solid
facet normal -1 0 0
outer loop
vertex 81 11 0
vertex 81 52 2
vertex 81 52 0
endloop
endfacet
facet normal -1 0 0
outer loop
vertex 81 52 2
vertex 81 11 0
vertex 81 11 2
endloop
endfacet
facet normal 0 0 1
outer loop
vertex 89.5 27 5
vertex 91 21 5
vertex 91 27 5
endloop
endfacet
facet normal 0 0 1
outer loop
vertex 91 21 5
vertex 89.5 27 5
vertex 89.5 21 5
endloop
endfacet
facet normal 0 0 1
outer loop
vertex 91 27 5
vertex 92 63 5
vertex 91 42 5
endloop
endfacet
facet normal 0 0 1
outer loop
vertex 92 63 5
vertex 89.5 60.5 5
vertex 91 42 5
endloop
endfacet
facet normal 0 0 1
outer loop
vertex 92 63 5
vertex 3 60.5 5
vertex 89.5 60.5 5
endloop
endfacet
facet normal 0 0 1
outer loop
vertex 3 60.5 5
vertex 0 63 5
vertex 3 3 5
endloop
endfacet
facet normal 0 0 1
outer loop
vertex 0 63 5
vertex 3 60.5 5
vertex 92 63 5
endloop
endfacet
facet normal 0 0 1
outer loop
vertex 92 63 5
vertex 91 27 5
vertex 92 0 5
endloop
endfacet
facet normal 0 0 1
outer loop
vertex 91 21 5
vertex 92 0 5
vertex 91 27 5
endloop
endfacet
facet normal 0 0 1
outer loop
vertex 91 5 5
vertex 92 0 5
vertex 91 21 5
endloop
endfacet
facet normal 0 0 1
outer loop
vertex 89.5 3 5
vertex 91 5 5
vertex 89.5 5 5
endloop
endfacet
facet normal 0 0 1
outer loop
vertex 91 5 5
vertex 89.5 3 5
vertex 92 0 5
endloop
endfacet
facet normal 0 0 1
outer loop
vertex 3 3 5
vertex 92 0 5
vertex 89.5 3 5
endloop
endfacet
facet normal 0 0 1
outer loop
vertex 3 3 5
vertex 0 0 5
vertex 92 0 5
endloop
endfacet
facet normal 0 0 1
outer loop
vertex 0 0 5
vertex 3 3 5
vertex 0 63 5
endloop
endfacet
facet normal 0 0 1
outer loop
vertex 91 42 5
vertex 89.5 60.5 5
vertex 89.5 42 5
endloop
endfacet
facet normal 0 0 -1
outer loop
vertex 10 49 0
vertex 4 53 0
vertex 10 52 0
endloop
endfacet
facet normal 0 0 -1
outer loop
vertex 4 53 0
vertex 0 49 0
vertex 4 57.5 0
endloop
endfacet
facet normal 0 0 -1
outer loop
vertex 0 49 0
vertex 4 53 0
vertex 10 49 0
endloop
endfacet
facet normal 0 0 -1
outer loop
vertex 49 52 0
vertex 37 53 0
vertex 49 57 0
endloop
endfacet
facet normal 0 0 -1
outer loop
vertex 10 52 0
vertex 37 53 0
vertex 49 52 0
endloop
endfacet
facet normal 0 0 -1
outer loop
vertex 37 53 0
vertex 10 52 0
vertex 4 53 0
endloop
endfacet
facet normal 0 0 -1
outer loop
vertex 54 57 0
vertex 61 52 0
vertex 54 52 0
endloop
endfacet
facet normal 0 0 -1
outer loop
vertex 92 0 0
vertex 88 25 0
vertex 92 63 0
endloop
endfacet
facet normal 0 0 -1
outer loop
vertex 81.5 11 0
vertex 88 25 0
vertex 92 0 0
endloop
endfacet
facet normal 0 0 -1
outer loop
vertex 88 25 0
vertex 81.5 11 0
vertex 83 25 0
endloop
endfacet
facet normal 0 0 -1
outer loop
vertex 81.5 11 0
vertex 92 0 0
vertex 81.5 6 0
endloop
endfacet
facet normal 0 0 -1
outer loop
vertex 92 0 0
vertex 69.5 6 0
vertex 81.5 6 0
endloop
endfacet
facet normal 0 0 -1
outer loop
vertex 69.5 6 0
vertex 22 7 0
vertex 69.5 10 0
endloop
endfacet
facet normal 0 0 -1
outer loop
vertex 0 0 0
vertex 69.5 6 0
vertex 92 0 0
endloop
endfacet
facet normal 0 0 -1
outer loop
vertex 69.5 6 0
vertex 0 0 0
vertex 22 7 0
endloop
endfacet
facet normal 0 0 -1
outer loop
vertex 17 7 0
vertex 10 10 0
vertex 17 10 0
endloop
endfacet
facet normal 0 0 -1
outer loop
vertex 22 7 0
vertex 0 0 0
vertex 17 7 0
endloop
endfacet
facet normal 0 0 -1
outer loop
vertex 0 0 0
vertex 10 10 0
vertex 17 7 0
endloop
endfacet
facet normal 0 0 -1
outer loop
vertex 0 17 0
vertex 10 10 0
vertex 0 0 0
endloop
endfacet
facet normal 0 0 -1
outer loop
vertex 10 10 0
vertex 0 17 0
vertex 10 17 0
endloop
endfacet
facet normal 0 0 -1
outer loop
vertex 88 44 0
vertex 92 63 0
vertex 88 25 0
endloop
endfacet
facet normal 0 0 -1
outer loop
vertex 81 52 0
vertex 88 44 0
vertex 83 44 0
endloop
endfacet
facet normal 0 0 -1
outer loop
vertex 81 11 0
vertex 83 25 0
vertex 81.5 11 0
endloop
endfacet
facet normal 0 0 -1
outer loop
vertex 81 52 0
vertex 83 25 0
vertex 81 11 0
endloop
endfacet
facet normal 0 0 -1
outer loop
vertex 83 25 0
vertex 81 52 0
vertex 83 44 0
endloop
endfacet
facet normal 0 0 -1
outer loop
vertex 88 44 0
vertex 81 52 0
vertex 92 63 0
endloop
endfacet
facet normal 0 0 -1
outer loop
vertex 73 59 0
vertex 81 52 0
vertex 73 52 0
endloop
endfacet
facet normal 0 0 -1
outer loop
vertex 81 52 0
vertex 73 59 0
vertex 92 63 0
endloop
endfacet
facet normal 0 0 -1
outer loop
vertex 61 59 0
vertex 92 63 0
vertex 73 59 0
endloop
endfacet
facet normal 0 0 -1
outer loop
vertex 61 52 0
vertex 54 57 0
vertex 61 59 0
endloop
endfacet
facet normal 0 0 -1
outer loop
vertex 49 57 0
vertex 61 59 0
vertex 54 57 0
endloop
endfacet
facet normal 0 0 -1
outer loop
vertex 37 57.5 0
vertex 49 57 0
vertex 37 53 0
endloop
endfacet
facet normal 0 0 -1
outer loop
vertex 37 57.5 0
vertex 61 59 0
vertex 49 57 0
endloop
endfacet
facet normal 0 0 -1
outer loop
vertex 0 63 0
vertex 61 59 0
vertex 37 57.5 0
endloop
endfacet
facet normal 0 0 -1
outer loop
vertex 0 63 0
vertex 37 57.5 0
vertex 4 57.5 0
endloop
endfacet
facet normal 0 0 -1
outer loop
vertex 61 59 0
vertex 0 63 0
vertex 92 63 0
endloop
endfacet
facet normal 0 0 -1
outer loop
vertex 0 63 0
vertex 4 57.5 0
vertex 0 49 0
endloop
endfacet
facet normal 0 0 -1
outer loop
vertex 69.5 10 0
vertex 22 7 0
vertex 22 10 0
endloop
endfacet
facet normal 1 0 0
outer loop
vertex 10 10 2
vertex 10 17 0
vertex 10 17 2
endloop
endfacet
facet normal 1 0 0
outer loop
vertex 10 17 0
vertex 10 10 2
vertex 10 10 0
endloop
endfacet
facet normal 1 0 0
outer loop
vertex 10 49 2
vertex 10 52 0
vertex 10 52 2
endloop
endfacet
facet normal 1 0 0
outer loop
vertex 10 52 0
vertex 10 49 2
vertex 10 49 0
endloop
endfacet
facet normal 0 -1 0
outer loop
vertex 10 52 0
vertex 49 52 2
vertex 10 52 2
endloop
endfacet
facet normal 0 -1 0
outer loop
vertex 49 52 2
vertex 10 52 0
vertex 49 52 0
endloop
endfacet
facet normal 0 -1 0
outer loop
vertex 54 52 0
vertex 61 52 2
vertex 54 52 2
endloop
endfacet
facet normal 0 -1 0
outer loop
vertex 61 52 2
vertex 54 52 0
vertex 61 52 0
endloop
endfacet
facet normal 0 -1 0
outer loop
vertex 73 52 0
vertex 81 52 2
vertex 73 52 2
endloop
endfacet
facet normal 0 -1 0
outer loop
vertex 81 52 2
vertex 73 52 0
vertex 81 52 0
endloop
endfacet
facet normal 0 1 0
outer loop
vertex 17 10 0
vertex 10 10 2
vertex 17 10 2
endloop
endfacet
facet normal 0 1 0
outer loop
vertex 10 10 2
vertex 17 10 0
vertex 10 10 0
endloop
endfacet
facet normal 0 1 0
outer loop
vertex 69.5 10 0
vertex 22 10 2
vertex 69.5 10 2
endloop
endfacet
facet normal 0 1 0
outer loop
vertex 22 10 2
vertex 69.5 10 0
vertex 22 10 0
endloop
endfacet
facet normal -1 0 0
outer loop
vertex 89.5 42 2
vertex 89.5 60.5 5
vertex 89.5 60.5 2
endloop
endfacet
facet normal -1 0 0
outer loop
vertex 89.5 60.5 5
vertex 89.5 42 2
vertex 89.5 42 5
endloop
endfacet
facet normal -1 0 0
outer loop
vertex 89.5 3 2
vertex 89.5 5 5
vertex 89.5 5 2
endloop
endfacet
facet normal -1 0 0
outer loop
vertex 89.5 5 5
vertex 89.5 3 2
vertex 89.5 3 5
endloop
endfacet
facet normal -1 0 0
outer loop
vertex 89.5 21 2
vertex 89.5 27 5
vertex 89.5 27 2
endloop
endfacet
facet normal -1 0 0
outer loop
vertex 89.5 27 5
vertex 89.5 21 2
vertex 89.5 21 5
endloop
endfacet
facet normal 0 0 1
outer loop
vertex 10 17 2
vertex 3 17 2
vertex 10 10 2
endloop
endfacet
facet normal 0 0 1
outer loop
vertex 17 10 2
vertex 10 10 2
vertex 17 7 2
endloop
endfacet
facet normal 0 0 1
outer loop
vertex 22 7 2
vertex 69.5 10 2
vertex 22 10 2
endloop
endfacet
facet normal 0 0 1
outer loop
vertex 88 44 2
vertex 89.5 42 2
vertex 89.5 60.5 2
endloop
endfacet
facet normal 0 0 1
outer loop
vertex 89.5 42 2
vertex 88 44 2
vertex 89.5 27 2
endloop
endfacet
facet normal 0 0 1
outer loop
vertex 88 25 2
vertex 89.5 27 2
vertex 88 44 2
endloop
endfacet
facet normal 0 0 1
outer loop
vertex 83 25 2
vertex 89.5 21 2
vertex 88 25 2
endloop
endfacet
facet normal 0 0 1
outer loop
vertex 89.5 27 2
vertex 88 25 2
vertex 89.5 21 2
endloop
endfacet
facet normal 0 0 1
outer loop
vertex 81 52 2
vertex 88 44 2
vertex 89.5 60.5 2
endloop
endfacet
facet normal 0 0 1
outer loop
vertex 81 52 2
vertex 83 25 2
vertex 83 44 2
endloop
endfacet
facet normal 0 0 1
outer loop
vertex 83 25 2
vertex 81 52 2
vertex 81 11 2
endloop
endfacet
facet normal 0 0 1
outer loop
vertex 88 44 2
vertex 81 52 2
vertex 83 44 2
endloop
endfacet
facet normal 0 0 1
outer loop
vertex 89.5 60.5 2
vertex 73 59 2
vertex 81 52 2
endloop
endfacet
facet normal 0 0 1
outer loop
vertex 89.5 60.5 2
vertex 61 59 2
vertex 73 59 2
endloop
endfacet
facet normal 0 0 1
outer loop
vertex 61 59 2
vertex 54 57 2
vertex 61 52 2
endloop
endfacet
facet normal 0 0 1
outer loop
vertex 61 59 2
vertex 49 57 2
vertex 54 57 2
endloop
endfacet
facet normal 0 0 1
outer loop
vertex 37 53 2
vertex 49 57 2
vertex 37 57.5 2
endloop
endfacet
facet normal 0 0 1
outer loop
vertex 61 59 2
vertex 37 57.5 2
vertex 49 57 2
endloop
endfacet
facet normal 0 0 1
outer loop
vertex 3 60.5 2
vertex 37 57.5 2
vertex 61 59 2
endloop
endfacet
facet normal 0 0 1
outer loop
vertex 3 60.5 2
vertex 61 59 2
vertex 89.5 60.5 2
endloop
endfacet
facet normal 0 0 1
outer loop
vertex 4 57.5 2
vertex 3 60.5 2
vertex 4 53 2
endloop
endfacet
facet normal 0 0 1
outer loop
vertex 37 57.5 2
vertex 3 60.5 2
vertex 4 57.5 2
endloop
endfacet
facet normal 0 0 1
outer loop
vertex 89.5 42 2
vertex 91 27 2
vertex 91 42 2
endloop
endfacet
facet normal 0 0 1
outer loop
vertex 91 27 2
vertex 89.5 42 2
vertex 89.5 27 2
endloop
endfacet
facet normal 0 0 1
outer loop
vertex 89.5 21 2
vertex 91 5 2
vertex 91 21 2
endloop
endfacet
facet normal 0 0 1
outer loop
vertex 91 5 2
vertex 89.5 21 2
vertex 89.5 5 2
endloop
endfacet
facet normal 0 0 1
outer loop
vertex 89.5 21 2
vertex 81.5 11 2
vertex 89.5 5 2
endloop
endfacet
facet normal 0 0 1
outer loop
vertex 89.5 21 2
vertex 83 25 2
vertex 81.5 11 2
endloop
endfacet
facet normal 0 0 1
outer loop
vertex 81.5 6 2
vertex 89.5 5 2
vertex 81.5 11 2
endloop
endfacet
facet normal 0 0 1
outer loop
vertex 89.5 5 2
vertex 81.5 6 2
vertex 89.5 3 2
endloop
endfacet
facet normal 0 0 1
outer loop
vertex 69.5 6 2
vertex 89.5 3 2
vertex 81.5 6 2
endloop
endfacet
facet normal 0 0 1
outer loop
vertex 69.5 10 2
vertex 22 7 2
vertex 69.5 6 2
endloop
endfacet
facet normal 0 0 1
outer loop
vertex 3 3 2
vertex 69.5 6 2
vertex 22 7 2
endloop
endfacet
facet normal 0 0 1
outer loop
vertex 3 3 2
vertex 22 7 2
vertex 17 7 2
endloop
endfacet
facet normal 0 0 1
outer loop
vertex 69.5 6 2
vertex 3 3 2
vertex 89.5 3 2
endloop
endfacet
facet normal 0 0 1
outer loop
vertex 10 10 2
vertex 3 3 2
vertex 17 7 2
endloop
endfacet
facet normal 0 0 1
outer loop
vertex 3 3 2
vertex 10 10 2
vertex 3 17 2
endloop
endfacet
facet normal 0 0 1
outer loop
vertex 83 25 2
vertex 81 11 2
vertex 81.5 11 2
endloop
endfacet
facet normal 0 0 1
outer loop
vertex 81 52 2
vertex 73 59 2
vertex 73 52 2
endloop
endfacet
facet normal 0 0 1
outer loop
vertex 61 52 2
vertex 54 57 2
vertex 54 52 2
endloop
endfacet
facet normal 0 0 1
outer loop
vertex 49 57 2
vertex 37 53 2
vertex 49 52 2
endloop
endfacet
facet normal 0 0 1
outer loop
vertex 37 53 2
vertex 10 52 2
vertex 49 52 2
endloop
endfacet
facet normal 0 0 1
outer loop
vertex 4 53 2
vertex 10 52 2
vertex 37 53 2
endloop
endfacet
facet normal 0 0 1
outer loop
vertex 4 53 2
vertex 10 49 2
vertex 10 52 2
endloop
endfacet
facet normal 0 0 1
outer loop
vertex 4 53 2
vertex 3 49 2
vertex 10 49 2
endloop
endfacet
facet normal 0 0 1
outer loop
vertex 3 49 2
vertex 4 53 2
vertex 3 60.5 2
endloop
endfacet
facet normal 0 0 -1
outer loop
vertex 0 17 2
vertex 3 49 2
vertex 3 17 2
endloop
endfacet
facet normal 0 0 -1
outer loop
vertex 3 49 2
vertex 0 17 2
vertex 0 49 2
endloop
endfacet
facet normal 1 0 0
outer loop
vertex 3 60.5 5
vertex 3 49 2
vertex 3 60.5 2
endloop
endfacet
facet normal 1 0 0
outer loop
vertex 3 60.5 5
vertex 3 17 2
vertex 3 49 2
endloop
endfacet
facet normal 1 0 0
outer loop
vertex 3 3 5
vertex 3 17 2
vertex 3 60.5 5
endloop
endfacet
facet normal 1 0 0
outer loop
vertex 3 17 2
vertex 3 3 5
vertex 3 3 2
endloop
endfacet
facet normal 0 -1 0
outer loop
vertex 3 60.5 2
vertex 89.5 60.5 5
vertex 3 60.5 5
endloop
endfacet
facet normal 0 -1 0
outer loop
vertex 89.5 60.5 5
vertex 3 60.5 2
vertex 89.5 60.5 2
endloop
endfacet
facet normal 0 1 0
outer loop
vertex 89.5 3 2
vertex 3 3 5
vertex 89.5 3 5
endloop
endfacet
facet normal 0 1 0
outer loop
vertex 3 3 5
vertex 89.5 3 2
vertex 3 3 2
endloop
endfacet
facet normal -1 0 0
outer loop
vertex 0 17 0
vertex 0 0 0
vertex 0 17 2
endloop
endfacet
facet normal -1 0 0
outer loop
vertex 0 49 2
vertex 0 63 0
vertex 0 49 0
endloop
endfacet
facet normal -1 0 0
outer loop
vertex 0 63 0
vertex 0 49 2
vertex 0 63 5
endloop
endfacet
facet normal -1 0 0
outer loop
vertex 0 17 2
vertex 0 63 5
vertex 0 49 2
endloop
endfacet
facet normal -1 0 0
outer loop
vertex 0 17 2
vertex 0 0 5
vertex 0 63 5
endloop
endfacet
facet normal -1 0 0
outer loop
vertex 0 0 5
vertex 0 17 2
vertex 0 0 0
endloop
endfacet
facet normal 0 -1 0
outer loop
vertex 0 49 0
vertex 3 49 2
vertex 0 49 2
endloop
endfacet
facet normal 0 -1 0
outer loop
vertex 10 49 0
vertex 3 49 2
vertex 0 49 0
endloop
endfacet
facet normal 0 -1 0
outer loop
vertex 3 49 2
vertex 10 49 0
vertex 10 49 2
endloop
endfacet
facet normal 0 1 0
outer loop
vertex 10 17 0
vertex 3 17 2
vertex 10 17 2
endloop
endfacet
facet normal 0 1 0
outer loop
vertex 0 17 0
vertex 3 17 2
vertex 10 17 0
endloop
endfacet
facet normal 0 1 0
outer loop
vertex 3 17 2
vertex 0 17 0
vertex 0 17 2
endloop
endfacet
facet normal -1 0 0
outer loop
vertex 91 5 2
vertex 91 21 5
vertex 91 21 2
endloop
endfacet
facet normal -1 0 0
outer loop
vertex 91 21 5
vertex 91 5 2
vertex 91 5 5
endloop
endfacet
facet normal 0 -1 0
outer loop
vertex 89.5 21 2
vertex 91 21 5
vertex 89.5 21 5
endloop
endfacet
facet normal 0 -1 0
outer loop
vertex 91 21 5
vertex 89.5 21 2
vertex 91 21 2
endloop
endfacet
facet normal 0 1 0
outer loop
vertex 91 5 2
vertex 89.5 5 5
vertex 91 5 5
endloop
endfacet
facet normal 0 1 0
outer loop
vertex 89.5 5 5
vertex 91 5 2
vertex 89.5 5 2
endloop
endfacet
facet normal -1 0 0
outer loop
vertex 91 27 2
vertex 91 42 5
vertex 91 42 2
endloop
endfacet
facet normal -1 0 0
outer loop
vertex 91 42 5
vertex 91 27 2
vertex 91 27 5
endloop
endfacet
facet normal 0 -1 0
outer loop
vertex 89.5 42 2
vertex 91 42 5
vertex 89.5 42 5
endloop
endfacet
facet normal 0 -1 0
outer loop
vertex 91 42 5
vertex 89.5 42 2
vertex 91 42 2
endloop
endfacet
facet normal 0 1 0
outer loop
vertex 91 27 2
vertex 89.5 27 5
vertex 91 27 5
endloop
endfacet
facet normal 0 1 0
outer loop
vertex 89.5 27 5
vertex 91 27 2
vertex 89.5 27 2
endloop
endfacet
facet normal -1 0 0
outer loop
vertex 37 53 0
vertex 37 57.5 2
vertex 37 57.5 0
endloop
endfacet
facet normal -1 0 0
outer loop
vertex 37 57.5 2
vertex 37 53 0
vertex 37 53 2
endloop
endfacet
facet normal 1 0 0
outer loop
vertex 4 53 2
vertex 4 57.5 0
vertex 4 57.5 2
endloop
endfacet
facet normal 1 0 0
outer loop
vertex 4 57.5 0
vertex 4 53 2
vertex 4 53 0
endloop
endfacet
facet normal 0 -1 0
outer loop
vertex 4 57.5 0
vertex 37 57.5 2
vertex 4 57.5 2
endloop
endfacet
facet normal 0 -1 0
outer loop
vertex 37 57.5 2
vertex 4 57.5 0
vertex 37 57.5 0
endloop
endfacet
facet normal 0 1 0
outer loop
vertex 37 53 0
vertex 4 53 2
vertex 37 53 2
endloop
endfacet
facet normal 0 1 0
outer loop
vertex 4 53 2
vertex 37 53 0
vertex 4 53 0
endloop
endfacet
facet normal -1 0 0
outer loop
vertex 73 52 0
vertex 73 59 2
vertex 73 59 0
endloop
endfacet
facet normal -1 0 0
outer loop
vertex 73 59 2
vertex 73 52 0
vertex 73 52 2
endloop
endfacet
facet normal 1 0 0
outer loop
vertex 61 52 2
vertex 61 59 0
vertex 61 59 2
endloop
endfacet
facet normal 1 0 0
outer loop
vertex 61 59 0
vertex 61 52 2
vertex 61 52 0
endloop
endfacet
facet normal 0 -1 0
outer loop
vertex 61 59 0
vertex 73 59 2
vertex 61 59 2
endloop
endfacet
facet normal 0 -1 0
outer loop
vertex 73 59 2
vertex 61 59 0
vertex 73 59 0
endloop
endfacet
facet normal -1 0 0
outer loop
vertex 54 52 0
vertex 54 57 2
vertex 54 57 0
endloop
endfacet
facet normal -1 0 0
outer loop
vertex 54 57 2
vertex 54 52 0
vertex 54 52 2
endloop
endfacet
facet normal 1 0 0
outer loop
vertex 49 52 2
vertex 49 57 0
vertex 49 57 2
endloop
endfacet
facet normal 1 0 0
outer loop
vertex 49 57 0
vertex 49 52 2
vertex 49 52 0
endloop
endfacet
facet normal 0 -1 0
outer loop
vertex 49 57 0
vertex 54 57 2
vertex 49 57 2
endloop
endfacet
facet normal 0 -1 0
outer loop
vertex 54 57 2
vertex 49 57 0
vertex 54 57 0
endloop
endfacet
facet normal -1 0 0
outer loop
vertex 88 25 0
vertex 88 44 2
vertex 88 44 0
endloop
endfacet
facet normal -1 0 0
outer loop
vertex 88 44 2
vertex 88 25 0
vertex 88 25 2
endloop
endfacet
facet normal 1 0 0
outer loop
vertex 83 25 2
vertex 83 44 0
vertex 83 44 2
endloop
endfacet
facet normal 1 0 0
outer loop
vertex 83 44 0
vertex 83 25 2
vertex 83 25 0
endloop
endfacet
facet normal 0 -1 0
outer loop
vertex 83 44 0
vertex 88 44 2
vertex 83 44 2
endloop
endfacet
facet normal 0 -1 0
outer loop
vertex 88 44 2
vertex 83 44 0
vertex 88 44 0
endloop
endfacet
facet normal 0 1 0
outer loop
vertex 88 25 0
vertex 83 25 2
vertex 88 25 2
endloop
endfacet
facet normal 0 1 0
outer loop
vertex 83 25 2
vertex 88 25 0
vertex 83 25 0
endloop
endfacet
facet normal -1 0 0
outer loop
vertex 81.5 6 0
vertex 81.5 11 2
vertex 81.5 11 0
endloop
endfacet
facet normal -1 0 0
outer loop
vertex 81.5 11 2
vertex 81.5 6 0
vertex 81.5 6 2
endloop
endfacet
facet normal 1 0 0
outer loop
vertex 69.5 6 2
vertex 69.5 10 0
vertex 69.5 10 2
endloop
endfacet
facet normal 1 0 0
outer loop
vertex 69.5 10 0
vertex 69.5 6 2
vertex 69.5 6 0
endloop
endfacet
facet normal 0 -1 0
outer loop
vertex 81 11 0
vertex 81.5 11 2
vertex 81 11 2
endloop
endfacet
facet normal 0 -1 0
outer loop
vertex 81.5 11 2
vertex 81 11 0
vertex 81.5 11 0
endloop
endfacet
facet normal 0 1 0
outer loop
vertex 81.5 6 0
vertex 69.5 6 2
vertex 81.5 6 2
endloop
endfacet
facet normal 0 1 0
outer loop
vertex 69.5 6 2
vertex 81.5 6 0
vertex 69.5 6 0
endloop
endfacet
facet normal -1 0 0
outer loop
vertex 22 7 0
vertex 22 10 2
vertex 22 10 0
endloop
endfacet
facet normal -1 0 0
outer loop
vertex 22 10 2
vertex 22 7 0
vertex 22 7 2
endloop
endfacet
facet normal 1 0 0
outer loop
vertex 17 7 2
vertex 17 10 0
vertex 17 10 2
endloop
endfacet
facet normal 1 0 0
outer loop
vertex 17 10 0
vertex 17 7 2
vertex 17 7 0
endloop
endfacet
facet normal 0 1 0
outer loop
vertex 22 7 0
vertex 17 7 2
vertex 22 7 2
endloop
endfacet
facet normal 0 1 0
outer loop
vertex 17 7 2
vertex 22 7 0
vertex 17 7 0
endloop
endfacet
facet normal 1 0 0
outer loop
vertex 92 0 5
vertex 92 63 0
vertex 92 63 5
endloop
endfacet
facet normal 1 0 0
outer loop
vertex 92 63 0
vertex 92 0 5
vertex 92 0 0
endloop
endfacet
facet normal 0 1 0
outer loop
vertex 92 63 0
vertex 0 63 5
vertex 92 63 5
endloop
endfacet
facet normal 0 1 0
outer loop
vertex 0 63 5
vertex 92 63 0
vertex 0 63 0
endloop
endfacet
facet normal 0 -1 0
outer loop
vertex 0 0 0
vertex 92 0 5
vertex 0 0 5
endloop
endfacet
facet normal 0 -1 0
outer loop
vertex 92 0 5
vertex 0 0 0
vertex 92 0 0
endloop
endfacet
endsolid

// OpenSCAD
// Globals

difference()
{
	union()
	{
		cube([92,63,5]);
	}

	union()
	{
		translate ([10,10,0]) cube ([71,42,5]);
		translate ([3,3,2]) cube ([86.5,57.5,3]);
		translate ([0,17,0]) cube ([10,32,2]); // SD Card
		translate ([88,5,2]) cube ([3,16,3]); // Ethernet Port
		translate ([88,27,2]) cube ([3,15,3]); // USB Ports
		translate ([4,53,0]) cube ([33,4.5,2]); // Soldered Pins
		translate ([61,52,0]) cube ([12,7,2]); // Soldered Pins
		translate ([49,52,0]) cube ([5,5,2]); // Soldered Pins
		translate ([83,25,0]) cube ([5,19,2]); // Soldered Pins
		translate ([69.5,6,0]) cube ([12,5,2]); // Soldered Pins
		translate ([17,7,0]) cube ([5,5,2]); // Soldered Pins
	}
}
